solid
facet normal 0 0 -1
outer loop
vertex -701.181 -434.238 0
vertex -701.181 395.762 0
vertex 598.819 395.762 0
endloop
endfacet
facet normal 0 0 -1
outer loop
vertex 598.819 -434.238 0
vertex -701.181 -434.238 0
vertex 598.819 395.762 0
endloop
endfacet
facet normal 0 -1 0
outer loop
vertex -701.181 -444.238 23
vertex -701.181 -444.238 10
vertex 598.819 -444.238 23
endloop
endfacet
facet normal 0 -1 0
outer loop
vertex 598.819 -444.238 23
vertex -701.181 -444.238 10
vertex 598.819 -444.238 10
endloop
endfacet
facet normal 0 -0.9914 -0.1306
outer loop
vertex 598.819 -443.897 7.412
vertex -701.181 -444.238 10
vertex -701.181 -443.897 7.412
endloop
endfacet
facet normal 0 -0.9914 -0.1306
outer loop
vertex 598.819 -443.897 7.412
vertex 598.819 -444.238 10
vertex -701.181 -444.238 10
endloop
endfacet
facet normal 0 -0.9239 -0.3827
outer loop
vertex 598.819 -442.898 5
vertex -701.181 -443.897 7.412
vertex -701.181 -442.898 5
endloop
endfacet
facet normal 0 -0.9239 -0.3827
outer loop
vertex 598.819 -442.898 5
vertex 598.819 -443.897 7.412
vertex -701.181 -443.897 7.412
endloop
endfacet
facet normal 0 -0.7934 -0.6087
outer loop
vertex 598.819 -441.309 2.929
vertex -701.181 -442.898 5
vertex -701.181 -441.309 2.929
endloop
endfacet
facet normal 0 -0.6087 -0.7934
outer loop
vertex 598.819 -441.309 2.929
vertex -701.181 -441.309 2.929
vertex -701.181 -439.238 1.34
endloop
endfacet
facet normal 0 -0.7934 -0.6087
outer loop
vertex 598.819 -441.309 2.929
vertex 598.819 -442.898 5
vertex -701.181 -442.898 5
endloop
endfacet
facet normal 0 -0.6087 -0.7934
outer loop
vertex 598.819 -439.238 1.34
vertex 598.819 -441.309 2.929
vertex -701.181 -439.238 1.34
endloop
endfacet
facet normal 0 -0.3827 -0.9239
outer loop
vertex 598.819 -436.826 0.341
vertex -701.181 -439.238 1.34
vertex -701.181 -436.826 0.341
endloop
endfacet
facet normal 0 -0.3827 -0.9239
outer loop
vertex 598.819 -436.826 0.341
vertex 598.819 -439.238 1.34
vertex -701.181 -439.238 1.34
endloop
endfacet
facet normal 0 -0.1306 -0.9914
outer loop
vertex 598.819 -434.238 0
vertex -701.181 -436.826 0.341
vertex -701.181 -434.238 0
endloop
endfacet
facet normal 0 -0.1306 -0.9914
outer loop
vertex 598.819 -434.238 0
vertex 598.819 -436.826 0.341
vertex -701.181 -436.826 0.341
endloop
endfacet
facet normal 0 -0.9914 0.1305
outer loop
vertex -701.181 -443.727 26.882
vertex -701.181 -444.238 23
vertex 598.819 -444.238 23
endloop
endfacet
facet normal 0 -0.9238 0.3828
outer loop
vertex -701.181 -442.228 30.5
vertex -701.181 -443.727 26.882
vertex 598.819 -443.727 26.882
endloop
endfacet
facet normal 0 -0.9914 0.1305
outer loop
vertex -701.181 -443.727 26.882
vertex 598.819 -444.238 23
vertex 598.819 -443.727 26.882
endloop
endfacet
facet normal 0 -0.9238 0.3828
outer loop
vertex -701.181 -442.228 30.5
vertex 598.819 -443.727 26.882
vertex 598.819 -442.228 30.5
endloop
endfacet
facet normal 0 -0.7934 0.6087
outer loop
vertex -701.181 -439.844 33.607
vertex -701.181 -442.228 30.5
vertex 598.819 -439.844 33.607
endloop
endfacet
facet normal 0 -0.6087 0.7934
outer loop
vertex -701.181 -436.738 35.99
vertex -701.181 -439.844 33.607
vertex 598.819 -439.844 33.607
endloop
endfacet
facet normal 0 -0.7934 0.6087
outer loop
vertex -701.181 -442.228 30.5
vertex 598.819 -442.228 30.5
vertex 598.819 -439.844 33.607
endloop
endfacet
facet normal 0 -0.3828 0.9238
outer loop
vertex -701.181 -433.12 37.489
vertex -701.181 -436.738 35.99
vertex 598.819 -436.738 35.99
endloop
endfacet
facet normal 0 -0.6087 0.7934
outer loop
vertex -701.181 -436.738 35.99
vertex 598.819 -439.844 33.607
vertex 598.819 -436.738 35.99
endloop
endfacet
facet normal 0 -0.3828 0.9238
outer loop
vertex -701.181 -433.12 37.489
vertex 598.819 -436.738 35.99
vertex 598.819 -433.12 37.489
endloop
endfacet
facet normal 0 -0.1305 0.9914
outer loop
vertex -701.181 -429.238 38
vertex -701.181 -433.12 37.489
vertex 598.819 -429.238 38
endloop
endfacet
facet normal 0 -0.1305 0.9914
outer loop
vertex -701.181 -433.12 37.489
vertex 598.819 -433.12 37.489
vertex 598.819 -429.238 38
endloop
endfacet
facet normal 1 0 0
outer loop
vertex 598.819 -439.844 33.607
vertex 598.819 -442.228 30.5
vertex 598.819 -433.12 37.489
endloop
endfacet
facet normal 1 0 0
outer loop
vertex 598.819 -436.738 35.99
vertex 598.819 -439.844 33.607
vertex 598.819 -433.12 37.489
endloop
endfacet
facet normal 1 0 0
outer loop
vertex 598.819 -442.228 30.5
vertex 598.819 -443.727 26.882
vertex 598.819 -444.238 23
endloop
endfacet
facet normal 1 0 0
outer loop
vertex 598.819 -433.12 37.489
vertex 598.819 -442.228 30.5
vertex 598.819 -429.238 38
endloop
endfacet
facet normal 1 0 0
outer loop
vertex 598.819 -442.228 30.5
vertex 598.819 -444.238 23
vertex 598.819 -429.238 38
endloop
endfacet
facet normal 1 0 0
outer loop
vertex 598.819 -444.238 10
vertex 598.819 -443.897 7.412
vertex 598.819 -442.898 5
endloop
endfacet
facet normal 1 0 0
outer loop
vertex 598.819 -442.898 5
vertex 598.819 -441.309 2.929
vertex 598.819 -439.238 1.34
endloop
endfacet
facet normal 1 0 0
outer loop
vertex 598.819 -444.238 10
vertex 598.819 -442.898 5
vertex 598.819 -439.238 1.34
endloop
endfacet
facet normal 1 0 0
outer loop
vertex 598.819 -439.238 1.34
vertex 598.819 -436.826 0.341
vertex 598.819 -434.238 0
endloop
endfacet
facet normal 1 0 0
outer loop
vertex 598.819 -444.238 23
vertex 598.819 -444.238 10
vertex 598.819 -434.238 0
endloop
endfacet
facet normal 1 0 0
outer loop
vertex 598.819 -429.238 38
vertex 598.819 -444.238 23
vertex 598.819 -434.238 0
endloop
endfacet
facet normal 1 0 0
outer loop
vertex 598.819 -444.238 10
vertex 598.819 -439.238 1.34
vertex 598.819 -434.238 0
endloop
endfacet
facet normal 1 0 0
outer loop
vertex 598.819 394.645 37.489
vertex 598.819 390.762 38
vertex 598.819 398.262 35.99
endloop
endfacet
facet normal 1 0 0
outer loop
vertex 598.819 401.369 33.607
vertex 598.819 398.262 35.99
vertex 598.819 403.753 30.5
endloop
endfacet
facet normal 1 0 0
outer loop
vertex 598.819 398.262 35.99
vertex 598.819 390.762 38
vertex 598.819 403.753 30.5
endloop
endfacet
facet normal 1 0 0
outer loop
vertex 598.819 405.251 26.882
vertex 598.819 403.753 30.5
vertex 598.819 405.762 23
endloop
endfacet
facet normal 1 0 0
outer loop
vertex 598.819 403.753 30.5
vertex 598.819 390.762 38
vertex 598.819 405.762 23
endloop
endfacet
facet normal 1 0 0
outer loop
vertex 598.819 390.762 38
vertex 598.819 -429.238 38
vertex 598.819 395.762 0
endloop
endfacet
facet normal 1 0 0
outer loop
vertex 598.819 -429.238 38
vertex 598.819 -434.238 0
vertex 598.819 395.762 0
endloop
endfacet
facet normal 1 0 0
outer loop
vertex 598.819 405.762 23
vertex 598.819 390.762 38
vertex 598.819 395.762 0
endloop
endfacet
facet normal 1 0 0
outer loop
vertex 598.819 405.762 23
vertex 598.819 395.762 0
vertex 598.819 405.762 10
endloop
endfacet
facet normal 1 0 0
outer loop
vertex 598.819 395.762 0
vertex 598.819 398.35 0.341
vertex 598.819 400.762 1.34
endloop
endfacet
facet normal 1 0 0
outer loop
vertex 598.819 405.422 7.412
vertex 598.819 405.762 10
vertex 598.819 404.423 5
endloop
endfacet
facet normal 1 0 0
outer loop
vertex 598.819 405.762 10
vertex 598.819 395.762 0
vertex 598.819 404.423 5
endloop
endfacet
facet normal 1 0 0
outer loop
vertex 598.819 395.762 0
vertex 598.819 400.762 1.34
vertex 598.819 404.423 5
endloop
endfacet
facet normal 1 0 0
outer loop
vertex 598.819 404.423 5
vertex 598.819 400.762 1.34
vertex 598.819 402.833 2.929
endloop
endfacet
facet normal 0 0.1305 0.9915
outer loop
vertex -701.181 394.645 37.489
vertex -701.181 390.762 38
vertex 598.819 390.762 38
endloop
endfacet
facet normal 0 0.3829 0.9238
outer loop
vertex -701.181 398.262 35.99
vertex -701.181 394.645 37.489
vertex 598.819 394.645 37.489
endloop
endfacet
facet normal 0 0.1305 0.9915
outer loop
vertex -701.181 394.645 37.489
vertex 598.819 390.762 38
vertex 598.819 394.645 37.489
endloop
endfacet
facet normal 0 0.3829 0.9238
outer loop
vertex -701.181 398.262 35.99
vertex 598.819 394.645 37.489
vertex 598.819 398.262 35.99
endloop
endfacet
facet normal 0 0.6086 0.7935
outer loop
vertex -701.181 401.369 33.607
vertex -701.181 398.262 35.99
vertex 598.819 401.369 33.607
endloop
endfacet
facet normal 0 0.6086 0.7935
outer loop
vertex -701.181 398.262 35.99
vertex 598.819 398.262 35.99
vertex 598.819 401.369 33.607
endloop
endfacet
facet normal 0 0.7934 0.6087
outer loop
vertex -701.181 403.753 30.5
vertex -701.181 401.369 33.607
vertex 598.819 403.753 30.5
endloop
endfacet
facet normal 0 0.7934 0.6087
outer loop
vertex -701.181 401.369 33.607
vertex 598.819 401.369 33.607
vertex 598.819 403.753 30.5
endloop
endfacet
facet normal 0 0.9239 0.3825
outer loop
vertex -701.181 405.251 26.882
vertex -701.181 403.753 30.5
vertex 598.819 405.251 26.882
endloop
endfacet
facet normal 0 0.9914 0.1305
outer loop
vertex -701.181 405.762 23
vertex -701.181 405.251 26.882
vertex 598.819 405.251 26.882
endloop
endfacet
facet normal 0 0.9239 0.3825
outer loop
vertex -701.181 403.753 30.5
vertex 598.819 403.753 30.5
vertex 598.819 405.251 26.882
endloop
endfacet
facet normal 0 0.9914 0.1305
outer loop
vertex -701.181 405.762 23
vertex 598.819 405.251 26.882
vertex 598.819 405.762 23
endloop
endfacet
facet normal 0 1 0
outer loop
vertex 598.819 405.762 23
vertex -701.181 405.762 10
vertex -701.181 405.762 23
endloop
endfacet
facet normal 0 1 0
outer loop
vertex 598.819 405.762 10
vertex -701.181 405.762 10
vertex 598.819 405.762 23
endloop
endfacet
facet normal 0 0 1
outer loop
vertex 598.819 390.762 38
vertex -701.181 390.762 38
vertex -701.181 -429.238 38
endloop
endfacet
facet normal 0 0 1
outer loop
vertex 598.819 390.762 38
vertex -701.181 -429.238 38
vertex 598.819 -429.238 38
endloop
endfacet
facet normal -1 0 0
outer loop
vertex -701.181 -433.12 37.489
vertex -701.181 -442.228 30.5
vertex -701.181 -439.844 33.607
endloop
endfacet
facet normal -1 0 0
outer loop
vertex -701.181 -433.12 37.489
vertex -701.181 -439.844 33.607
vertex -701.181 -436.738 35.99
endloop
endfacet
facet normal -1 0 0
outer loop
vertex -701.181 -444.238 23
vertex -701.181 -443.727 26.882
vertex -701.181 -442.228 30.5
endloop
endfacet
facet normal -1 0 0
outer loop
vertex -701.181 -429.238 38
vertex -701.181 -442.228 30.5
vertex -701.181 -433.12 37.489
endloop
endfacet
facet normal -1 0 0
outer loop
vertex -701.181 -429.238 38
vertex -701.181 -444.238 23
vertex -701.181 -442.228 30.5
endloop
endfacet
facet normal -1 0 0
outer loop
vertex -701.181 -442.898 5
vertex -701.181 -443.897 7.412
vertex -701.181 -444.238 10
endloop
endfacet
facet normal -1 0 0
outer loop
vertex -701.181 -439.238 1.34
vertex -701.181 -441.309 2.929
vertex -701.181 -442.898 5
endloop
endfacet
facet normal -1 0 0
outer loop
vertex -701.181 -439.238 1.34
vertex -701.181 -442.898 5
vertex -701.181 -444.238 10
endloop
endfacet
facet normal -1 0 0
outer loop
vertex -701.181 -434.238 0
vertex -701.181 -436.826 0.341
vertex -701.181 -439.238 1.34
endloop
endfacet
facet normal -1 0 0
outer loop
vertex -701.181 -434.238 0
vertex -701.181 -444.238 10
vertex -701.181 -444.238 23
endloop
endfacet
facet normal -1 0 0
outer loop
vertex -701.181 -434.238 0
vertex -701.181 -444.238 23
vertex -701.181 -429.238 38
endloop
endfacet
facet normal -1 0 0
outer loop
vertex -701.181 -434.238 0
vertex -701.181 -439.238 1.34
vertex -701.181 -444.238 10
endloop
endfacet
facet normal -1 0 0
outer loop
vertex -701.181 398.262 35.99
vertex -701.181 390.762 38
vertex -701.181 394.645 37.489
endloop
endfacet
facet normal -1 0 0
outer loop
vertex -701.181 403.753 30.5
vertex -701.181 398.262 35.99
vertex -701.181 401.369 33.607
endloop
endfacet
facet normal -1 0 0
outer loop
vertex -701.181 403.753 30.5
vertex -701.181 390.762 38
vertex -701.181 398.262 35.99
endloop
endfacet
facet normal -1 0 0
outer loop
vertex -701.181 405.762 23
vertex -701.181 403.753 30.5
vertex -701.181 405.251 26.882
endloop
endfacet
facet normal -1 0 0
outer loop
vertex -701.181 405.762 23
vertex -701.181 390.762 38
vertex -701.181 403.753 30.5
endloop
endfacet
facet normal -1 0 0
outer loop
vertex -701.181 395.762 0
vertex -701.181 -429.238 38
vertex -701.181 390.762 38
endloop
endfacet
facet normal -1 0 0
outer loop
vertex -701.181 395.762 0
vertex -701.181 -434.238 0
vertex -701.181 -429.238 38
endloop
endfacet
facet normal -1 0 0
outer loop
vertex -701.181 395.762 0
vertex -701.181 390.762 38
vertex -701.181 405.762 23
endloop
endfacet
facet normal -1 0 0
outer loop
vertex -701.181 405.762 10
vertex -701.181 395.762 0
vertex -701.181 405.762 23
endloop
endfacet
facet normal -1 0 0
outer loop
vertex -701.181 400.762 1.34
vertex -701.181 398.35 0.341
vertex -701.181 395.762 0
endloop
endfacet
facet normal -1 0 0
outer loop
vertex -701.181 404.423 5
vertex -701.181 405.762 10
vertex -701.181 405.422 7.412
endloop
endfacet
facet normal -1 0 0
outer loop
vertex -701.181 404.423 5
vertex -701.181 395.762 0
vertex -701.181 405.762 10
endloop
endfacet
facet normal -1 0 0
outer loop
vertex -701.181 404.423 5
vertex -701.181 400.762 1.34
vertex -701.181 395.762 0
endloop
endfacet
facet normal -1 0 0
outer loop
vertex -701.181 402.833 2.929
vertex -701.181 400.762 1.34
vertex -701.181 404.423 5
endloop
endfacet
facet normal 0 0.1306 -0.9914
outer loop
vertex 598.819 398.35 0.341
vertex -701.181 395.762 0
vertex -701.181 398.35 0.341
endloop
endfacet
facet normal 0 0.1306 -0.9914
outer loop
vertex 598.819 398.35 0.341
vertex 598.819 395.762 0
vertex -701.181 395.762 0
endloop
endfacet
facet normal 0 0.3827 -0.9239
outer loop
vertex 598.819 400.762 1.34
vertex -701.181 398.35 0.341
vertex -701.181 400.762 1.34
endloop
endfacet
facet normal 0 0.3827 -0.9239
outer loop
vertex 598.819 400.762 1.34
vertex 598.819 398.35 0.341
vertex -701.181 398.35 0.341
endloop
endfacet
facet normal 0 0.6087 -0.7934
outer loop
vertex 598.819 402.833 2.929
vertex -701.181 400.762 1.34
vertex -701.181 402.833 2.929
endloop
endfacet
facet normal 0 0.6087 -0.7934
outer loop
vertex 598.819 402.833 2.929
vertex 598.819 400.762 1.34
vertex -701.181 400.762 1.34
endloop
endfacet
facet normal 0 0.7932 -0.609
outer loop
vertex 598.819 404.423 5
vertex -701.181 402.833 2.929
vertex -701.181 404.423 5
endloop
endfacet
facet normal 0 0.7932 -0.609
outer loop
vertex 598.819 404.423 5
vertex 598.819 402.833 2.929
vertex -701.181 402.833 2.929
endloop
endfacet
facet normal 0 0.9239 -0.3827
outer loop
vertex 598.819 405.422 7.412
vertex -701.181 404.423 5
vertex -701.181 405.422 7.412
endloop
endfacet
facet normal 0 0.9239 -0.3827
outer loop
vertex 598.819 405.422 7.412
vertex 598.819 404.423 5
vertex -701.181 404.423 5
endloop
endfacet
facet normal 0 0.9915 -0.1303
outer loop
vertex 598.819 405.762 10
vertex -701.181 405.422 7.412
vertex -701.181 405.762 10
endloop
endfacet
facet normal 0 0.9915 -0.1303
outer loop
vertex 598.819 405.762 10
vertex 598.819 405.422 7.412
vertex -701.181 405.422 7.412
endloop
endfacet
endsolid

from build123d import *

# Parameters (mm, degrees)
F0_W     = 1300
F0_H     = 850
F1_DEPTH = 38
F2_R     = 15
F3_R     = 15
F4_R     = 10
F5_R     = 10


with BuildPart() as f1:
    # F0 (on Top) → F1 (new body)
    with BuildSketch(Plane.XY):
        with Locations((-51.181306, -19.237691)):
            Rectangle(F0_W, F0_H)
    extrude(amount=F1_DEPTH)

    # F2
    f2_edges = [f1.edges().sort_by_distance(p)[0] for p in [
        (-51.181306, -444.237691, 38),
    ]]
    fillet(f2_edges, radius=F2_R)

    # F3
    f3_edges = [f1.edges().sort_by_distance(p)[0] for p in [
        (-51.181306, 405.762309, 38),
    ]]
    fillet(f3_edges, radius=F3_R)

    # F4
    f4_edges = [f1.edges().sort_by_distance(p)[0] for p in [
        (-51.181306, -444.237691, 0),
    ]]
    fillet(f4_edges, radius=F4_R)

    # F5
    f5_edges = [f1.edges().sort_by_distance(p)[0] for p in [
        (-51.181306, 405.762309, 0),
    ]]
    fillet(f5_edges, radius=F5_R)


solid = f1.part
